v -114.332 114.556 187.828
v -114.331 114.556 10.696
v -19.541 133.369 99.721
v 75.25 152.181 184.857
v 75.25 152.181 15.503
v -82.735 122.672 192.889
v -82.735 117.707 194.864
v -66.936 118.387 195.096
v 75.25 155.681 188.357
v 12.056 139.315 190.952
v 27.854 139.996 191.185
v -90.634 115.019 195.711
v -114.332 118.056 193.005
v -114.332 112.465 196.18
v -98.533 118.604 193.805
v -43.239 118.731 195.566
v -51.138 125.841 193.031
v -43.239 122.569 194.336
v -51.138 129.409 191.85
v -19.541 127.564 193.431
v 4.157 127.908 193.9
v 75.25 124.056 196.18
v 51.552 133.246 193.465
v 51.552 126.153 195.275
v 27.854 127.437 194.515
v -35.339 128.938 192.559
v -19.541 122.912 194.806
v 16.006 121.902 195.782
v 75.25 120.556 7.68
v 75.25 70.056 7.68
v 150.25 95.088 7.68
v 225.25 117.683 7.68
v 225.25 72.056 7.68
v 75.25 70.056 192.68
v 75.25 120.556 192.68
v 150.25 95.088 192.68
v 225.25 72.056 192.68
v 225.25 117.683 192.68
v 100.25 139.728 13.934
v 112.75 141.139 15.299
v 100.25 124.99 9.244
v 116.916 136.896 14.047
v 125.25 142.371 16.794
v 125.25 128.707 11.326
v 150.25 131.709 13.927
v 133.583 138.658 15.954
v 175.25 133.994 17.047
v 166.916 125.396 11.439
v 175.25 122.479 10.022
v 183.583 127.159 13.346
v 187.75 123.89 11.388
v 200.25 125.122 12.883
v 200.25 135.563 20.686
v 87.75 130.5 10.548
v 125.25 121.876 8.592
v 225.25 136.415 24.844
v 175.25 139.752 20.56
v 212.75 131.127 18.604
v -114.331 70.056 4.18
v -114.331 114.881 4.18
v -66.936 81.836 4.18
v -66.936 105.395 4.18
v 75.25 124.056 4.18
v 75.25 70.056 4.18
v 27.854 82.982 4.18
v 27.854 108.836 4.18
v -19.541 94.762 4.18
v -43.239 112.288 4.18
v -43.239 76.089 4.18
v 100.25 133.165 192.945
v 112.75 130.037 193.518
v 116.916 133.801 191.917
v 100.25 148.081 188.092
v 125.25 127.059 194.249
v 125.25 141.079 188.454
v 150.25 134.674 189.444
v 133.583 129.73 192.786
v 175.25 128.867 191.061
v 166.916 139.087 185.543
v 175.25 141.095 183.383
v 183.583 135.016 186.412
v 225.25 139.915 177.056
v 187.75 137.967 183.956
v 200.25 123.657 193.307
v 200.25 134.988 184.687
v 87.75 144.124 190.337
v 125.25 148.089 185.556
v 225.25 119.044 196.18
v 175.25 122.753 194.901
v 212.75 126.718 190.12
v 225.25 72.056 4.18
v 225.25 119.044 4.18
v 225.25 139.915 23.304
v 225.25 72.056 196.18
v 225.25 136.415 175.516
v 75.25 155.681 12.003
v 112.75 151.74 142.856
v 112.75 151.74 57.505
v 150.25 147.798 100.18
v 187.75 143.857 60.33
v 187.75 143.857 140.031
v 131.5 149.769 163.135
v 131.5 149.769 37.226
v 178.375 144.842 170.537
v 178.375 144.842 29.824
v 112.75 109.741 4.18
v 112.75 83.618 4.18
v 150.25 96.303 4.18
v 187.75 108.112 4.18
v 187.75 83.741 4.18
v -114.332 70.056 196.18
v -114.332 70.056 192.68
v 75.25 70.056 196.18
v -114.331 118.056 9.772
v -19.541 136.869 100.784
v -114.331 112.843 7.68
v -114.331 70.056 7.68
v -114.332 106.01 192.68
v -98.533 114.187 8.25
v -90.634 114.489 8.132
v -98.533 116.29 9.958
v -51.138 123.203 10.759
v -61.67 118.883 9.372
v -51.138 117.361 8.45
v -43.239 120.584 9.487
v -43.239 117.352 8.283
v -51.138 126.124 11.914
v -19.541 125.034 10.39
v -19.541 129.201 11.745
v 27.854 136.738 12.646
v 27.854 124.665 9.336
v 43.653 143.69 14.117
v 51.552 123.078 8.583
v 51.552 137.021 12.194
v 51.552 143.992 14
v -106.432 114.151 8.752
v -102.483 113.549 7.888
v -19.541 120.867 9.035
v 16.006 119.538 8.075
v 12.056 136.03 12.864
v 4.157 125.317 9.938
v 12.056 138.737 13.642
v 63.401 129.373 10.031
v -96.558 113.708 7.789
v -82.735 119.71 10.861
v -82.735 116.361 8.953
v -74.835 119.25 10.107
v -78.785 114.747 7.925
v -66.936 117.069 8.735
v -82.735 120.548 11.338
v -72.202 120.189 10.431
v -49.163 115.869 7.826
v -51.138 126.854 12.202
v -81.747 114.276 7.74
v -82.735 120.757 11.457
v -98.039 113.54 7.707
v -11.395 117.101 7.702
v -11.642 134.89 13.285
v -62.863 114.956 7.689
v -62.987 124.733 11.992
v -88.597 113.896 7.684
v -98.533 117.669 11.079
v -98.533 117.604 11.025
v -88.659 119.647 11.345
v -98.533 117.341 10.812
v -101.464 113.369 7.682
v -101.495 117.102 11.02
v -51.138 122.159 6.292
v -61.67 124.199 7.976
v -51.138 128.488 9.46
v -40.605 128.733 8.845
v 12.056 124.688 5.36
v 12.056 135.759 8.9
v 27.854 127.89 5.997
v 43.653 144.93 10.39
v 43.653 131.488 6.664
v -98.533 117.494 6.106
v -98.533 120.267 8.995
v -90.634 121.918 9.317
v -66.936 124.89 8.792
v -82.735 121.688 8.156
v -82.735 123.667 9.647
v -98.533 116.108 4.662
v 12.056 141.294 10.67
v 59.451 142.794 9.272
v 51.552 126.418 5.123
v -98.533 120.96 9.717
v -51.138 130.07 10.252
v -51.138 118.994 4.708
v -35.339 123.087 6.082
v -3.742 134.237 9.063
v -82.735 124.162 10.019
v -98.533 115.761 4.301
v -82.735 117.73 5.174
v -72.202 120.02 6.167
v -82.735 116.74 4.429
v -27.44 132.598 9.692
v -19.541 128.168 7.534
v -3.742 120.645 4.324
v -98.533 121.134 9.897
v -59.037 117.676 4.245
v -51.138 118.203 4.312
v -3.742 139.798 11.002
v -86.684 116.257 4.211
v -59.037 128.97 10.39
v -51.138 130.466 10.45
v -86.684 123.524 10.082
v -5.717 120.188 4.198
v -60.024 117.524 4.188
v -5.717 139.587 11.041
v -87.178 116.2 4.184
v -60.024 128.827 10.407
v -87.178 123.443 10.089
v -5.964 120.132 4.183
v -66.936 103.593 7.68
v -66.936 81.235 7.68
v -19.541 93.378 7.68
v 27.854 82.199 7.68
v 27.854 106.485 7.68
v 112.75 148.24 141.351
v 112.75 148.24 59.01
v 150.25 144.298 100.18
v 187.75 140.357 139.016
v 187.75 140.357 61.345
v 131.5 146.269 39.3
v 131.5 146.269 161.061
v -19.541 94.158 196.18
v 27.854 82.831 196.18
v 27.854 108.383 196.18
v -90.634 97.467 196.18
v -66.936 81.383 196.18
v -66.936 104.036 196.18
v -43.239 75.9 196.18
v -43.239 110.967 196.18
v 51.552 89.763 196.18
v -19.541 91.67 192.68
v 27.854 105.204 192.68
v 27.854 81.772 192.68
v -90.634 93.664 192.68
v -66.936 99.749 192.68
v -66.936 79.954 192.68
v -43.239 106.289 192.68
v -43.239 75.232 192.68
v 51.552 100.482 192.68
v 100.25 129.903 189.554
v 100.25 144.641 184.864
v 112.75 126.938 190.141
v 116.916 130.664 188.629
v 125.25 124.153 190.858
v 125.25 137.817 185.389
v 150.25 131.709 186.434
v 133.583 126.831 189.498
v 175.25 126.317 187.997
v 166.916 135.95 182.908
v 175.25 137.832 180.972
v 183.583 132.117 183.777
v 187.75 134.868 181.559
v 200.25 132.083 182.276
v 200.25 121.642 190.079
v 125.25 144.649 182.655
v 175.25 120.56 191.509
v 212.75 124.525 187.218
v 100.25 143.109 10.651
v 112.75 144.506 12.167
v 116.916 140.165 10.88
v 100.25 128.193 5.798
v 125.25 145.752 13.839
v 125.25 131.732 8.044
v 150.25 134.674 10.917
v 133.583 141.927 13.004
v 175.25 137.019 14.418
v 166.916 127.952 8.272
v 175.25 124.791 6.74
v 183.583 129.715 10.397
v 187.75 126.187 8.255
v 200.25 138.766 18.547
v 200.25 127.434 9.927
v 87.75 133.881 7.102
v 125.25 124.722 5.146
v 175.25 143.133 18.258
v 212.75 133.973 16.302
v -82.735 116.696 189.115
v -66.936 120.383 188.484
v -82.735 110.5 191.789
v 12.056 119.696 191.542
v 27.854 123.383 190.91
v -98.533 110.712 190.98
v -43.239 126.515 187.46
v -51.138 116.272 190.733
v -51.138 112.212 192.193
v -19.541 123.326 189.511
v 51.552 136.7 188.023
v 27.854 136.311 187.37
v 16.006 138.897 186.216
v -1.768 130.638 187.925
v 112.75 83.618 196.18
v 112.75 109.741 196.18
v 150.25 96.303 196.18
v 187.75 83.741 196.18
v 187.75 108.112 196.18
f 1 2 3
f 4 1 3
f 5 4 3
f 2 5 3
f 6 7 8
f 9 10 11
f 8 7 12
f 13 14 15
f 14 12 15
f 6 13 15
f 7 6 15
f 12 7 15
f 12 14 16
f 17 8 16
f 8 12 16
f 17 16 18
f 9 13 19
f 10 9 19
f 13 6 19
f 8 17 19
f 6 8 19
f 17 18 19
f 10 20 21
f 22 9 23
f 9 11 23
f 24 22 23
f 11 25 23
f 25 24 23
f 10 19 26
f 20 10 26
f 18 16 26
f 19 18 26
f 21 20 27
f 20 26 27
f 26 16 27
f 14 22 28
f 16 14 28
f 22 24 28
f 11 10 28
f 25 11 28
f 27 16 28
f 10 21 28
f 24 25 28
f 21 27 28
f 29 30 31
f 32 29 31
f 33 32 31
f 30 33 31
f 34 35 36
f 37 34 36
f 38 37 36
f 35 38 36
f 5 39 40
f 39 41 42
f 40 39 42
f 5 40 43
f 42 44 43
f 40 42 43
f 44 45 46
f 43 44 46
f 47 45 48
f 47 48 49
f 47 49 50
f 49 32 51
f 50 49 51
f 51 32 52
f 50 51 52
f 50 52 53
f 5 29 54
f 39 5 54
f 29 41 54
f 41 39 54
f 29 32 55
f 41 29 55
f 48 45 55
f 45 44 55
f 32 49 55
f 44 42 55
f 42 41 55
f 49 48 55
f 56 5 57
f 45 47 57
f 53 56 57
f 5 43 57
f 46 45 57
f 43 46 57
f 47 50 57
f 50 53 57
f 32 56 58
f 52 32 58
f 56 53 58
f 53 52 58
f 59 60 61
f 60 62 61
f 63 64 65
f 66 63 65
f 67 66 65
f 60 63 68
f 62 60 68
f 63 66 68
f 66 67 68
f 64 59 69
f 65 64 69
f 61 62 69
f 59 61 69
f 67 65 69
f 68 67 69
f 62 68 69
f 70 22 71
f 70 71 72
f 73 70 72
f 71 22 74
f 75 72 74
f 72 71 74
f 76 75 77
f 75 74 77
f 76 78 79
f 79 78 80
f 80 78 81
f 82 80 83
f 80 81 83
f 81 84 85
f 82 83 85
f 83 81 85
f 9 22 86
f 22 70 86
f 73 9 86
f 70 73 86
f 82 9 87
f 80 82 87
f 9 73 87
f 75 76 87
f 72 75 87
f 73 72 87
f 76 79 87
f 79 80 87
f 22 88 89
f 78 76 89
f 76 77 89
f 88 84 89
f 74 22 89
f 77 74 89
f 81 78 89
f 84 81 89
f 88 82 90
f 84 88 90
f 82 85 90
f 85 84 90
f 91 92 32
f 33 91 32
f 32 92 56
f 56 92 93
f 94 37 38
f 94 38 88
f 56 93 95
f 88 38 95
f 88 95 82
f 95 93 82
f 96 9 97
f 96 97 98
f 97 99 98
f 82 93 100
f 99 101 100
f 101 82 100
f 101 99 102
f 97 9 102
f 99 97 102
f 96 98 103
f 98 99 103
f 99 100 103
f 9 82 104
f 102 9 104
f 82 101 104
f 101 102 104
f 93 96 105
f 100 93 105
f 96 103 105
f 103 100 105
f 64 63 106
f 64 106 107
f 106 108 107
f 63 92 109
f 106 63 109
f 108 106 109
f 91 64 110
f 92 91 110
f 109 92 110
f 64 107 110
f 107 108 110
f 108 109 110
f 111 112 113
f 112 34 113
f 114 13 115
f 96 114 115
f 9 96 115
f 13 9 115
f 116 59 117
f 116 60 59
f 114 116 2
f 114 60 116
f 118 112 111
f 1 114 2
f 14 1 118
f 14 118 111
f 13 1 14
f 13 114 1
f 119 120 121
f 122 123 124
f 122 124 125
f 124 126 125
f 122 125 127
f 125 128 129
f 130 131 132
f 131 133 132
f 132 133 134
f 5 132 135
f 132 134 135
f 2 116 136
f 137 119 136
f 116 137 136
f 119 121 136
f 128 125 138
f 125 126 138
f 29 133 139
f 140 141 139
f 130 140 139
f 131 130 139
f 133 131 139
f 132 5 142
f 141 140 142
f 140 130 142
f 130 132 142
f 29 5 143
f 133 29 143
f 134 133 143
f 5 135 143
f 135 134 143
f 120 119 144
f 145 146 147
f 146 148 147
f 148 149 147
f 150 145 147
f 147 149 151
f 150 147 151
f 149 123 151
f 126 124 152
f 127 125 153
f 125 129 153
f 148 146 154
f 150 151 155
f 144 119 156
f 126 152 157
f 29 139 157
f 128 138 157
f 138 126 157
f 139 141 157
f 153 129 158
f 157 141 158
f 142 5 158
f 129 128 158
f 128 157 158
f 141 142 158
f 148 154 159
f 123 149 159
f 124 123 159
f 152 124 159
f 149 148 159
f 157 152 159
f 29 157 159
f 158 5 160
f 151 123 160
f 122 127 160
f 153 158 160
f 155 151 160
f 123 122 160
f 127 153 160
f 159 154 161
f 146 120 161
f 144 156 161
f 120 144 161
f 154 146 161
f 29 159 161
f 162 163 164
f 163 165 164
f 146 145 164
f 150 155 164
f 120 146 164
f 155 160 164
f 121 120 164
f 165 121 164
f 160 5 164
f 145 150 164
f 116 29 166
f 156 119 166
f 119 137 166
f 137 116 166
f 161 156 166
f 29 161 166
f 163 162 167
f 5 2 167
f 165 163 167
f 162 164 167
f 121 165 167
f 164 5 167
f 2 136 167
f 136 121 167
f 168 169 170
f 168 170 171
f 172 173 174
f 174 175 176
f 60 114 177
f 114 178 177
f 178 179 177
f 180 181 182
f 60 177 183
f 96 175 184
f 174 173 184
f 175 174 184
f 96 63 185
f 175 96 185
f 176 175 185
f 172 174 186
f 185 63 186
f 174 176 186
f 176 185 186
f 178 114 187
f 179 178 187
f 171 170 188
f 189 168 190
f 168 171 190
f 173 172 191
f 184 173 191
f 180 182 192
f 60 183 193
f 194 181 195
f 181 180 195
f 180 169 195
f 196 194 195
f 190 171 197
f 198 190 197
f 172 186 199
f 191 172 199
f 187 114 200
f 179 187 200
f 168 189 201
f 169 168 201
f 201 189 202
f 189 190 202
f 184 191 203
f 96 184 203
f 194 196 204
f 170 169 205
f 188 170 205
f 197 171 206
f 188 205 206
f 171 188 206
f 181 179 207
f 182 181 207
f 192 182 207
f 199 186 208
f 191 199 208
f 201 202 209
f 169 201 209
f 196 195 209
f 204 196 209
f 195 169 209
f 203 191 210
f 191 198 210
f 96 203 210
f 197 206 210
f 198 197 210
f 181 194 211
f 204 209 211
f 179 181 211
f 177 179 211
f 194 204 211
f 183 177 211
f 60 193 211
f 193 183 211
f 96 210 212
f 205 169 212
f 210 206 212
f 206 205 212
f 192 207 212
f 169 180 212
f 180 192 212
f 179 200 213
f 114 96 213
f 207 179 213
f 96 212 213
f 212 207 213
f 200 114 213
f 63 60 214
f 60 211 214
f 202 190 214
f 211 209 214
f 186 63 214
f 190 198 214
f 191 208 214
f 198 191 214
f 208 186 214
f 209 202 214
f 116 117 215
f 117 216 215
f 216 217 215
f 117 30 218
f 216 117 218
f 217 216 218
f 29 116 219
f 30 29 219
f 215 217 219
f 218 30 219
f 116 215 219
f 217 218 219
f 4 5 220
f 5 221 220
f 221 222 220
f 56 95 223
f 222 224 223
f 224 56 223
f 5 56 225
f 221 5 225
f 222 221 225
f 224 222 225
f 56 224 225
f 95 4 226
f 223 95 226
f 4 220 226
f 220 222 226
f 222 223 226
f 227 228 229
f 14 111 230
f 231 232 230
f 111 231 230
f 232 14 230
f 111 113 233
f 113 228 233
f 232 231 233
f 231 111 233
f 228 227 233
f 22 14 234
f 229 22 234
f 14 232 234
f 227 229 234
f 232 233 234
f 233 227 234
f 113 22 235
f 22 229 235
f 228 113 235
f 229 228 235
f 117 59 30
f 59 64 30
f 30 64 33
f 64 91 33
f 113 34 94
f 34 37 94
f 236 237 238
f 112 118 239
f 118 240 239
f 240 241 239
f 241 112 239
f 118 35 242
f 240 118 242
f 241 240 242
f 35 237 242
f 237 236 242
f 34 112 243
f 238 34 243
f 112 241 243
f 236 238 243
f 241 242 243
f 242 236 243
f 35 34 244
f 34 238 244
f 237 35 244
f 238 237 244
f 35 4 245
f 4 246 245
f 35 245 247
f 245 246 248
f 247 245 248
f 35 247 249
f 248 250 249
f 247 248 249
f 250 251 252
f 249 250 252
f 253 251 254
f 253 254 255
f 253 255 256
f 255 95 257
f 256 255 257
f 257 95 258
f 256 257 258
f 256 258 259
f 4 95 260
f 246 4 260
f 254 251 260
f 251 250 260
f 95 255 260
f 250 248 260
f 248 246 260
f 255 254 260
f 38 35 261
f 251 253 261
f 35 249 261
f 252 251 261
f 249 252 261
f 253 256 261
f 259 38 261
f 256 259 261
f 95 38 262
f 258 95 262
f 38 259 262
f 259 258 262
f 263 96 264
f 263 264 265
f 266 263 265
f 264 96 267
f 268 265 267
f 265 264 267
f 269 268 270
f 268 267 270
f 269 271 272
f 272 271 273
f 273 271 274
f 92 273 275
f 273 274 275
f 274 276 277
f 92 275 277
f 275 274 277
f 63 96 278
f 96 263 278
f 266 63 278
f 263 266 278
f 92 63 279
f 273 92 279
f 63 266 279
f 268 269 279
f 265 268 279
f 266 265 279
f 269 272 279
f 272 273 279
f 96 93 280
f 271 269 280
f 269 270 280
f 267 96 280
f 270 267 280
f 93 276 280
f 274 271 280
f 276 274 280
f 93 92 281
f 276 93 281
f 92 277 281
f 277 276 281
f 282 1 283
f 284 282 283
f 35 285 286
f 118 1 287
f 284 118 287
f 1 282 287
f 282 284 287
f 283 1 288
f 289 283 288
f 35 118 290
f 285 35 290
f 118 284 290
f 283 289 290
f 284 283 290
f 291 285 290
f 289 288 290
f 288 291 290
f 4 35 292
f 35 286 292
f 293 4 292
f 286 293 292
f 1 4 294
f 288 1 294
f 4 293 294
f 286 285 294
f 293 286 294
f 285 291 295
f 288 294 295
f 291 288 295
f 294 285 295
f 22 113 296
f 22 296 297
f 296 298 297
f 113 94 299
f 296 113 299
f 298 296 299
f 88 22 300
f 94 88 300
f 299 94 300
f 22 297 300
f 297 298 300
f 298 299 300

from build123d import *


with BuildPart() as part:
    # Sketch8 → Loft2 section 0
    with BuildSketch(Plane(origin=(-114.331486138, 0, -5.6121e-05), x_dir=(-4.908629793444053e-07, 0, 0.9999999999998797), z_dir=(-0.9999999999998797, 0, -4.908629793444053e-07))):
        with BuildLine():
            Line((4.180319673, 70.055915721), (7.680319673, 70.055915721))
            Line((7.680319673, 70.055915721), (7.680319673, 112.843431855))
            Line((7.680319673, 112.843431855), (10.696061863, 114.555915721))
            Line((10.696061863, 114.555915721), (187.827817904, 114.555915721))
            Line((187.827817904, 114.555915721), (192.680319673, 106.010495472))
            Line((192.680319673, 106.010495472), (192.680319673, 70.055915721))
            Line((192.680319673, 70.055915721), (196.180319673, 70.055915721))
            Line((196.180319673, 70.055915721), (196.180319673, 112.464586674))
            Line((196.180319673, 112.464586674), (193.005293366, 118.055915721))
            Line((193.005293366, 118.055915721), (9.771648721, 118.055915721))
            Line((9.771648721, 118.055915721), (4.180319673, 114.880889414))
            Line((4.180319673, 114.880889414), (4.180319673, 70.055915721))
        make_face()
    # Sketch4 → Loft2 section 1
    with BuildSketch(Plane.ZY.offset(-75.249688297)):
        with BuildLine():
            Line((7.680356611, 70.055915721), (7.680356611, 120.555915721))
            Line((7.680356611, 120.555915721), (15.50347472, 152.181098948))
            Line((15.50347472, 152.181098948), (184.857238502, 152.181098948))
            Line((184.857238502, 152.181098948), (192.680356611, 120.555915721))
            Line((192.680356611, 120.555915721), (192.680356611, 70.055915721))
            Line((192.680356611, 70.055915721), (196.180356611, 70.055915721))
            Line((196.180356611, 70.055915721), (196.180356611, 124.055915721))
            Line((196.180356611, 124.055915721), (188.357238502, 155.681098948))
            Line((188.357238502, 155.681098948), (12.00347472, 155.681098948))
            Line((12.00347472, 155.681098948), (4.180356611, 124.055915721))
            Line((4.180356611, 124.055915721), (4.180356611, 70.055915721))
            Line((4.180356611, 70.055915721), (7.680356611, 70.055915721))
        make_face()
    loft()

    # Sketch4<4> → Loft3 section 0
    with BuildSketch(Plane.ZY.offset(-75.249688297)):
        with BuildLine():
            Line((7.680356611, 70.055915721), (7.680356611, 120.555915721))
            Line((7.680356611, 120.555915721), (15.50347472, 152.181098948))
            Line((15.50347472, 152.181098948), (184.857238502, 152.181098948))
            Line((184.857238502, 152.181098948), (192.680356611, 120.555915721))
            Line((192.680356611, 120.555915721), (192.680356611, 70.055915721))
            Line((192.680356611, 70.055915721), (196.180356611, 70.055915721))
            Line((196.180356611, 70.055915721), (196.180356611, 124.055915721))
            Line((196.180356611, 124.055915721), (188.357238502, 155.681098948))
            Line((188.357238502, 155.681098948), (12.00347472, 155.681098948))
            Line((12.00347472, 155.681098948), (4.180356611, 124.055915721))
            Line((4.180356611, 124.055915721), (4.180356611, 70.055915721))
            Line((4.180356611, 70.055915721), (7.680356611, 70.055915721))
        make_face()
    # Sketch5 → Loft3 section 1
    with BuildSketch(Plane.ZY.offset(-225.249688297)):
        with BuildLine():
            Line((7.680356611, 72.055915721), (7.680356611, 117.683003445))
            Line((7.680356611, 117.683003445), (24.844432257, 136.415463658))
            Line((24.844432257, 136.415463658), (175.516280964, 136.415463658))
            Line((175.516280964, 136.415463658), (192.680356611, 117.683003445))
            Line((192.680356611, 117.683003445), (192.680356611, 72.055915721))
            Line((192.680356611, 72.055915721), (196.180356611, 72.055915721))
            Line((196.180356611, 72.055915721), (196.180356611, 119.044016942))
            Line((196.180356611, 119.044016942), (177.056382173, 139.915463658))
            Line((177.056382173, 139.915463658), (23.304331049, 139.915463658))
            Line((23.304331049, 139.915463658), (4.180356611, 119.044016942))
            Line((4.180356611, 119.044016942), (4.180356611, 72.055915721))
            Line((4.180356611, 72.055915721), (7.680356611, 72.055915721))
        make_face()
    loft()


solid = part.part
